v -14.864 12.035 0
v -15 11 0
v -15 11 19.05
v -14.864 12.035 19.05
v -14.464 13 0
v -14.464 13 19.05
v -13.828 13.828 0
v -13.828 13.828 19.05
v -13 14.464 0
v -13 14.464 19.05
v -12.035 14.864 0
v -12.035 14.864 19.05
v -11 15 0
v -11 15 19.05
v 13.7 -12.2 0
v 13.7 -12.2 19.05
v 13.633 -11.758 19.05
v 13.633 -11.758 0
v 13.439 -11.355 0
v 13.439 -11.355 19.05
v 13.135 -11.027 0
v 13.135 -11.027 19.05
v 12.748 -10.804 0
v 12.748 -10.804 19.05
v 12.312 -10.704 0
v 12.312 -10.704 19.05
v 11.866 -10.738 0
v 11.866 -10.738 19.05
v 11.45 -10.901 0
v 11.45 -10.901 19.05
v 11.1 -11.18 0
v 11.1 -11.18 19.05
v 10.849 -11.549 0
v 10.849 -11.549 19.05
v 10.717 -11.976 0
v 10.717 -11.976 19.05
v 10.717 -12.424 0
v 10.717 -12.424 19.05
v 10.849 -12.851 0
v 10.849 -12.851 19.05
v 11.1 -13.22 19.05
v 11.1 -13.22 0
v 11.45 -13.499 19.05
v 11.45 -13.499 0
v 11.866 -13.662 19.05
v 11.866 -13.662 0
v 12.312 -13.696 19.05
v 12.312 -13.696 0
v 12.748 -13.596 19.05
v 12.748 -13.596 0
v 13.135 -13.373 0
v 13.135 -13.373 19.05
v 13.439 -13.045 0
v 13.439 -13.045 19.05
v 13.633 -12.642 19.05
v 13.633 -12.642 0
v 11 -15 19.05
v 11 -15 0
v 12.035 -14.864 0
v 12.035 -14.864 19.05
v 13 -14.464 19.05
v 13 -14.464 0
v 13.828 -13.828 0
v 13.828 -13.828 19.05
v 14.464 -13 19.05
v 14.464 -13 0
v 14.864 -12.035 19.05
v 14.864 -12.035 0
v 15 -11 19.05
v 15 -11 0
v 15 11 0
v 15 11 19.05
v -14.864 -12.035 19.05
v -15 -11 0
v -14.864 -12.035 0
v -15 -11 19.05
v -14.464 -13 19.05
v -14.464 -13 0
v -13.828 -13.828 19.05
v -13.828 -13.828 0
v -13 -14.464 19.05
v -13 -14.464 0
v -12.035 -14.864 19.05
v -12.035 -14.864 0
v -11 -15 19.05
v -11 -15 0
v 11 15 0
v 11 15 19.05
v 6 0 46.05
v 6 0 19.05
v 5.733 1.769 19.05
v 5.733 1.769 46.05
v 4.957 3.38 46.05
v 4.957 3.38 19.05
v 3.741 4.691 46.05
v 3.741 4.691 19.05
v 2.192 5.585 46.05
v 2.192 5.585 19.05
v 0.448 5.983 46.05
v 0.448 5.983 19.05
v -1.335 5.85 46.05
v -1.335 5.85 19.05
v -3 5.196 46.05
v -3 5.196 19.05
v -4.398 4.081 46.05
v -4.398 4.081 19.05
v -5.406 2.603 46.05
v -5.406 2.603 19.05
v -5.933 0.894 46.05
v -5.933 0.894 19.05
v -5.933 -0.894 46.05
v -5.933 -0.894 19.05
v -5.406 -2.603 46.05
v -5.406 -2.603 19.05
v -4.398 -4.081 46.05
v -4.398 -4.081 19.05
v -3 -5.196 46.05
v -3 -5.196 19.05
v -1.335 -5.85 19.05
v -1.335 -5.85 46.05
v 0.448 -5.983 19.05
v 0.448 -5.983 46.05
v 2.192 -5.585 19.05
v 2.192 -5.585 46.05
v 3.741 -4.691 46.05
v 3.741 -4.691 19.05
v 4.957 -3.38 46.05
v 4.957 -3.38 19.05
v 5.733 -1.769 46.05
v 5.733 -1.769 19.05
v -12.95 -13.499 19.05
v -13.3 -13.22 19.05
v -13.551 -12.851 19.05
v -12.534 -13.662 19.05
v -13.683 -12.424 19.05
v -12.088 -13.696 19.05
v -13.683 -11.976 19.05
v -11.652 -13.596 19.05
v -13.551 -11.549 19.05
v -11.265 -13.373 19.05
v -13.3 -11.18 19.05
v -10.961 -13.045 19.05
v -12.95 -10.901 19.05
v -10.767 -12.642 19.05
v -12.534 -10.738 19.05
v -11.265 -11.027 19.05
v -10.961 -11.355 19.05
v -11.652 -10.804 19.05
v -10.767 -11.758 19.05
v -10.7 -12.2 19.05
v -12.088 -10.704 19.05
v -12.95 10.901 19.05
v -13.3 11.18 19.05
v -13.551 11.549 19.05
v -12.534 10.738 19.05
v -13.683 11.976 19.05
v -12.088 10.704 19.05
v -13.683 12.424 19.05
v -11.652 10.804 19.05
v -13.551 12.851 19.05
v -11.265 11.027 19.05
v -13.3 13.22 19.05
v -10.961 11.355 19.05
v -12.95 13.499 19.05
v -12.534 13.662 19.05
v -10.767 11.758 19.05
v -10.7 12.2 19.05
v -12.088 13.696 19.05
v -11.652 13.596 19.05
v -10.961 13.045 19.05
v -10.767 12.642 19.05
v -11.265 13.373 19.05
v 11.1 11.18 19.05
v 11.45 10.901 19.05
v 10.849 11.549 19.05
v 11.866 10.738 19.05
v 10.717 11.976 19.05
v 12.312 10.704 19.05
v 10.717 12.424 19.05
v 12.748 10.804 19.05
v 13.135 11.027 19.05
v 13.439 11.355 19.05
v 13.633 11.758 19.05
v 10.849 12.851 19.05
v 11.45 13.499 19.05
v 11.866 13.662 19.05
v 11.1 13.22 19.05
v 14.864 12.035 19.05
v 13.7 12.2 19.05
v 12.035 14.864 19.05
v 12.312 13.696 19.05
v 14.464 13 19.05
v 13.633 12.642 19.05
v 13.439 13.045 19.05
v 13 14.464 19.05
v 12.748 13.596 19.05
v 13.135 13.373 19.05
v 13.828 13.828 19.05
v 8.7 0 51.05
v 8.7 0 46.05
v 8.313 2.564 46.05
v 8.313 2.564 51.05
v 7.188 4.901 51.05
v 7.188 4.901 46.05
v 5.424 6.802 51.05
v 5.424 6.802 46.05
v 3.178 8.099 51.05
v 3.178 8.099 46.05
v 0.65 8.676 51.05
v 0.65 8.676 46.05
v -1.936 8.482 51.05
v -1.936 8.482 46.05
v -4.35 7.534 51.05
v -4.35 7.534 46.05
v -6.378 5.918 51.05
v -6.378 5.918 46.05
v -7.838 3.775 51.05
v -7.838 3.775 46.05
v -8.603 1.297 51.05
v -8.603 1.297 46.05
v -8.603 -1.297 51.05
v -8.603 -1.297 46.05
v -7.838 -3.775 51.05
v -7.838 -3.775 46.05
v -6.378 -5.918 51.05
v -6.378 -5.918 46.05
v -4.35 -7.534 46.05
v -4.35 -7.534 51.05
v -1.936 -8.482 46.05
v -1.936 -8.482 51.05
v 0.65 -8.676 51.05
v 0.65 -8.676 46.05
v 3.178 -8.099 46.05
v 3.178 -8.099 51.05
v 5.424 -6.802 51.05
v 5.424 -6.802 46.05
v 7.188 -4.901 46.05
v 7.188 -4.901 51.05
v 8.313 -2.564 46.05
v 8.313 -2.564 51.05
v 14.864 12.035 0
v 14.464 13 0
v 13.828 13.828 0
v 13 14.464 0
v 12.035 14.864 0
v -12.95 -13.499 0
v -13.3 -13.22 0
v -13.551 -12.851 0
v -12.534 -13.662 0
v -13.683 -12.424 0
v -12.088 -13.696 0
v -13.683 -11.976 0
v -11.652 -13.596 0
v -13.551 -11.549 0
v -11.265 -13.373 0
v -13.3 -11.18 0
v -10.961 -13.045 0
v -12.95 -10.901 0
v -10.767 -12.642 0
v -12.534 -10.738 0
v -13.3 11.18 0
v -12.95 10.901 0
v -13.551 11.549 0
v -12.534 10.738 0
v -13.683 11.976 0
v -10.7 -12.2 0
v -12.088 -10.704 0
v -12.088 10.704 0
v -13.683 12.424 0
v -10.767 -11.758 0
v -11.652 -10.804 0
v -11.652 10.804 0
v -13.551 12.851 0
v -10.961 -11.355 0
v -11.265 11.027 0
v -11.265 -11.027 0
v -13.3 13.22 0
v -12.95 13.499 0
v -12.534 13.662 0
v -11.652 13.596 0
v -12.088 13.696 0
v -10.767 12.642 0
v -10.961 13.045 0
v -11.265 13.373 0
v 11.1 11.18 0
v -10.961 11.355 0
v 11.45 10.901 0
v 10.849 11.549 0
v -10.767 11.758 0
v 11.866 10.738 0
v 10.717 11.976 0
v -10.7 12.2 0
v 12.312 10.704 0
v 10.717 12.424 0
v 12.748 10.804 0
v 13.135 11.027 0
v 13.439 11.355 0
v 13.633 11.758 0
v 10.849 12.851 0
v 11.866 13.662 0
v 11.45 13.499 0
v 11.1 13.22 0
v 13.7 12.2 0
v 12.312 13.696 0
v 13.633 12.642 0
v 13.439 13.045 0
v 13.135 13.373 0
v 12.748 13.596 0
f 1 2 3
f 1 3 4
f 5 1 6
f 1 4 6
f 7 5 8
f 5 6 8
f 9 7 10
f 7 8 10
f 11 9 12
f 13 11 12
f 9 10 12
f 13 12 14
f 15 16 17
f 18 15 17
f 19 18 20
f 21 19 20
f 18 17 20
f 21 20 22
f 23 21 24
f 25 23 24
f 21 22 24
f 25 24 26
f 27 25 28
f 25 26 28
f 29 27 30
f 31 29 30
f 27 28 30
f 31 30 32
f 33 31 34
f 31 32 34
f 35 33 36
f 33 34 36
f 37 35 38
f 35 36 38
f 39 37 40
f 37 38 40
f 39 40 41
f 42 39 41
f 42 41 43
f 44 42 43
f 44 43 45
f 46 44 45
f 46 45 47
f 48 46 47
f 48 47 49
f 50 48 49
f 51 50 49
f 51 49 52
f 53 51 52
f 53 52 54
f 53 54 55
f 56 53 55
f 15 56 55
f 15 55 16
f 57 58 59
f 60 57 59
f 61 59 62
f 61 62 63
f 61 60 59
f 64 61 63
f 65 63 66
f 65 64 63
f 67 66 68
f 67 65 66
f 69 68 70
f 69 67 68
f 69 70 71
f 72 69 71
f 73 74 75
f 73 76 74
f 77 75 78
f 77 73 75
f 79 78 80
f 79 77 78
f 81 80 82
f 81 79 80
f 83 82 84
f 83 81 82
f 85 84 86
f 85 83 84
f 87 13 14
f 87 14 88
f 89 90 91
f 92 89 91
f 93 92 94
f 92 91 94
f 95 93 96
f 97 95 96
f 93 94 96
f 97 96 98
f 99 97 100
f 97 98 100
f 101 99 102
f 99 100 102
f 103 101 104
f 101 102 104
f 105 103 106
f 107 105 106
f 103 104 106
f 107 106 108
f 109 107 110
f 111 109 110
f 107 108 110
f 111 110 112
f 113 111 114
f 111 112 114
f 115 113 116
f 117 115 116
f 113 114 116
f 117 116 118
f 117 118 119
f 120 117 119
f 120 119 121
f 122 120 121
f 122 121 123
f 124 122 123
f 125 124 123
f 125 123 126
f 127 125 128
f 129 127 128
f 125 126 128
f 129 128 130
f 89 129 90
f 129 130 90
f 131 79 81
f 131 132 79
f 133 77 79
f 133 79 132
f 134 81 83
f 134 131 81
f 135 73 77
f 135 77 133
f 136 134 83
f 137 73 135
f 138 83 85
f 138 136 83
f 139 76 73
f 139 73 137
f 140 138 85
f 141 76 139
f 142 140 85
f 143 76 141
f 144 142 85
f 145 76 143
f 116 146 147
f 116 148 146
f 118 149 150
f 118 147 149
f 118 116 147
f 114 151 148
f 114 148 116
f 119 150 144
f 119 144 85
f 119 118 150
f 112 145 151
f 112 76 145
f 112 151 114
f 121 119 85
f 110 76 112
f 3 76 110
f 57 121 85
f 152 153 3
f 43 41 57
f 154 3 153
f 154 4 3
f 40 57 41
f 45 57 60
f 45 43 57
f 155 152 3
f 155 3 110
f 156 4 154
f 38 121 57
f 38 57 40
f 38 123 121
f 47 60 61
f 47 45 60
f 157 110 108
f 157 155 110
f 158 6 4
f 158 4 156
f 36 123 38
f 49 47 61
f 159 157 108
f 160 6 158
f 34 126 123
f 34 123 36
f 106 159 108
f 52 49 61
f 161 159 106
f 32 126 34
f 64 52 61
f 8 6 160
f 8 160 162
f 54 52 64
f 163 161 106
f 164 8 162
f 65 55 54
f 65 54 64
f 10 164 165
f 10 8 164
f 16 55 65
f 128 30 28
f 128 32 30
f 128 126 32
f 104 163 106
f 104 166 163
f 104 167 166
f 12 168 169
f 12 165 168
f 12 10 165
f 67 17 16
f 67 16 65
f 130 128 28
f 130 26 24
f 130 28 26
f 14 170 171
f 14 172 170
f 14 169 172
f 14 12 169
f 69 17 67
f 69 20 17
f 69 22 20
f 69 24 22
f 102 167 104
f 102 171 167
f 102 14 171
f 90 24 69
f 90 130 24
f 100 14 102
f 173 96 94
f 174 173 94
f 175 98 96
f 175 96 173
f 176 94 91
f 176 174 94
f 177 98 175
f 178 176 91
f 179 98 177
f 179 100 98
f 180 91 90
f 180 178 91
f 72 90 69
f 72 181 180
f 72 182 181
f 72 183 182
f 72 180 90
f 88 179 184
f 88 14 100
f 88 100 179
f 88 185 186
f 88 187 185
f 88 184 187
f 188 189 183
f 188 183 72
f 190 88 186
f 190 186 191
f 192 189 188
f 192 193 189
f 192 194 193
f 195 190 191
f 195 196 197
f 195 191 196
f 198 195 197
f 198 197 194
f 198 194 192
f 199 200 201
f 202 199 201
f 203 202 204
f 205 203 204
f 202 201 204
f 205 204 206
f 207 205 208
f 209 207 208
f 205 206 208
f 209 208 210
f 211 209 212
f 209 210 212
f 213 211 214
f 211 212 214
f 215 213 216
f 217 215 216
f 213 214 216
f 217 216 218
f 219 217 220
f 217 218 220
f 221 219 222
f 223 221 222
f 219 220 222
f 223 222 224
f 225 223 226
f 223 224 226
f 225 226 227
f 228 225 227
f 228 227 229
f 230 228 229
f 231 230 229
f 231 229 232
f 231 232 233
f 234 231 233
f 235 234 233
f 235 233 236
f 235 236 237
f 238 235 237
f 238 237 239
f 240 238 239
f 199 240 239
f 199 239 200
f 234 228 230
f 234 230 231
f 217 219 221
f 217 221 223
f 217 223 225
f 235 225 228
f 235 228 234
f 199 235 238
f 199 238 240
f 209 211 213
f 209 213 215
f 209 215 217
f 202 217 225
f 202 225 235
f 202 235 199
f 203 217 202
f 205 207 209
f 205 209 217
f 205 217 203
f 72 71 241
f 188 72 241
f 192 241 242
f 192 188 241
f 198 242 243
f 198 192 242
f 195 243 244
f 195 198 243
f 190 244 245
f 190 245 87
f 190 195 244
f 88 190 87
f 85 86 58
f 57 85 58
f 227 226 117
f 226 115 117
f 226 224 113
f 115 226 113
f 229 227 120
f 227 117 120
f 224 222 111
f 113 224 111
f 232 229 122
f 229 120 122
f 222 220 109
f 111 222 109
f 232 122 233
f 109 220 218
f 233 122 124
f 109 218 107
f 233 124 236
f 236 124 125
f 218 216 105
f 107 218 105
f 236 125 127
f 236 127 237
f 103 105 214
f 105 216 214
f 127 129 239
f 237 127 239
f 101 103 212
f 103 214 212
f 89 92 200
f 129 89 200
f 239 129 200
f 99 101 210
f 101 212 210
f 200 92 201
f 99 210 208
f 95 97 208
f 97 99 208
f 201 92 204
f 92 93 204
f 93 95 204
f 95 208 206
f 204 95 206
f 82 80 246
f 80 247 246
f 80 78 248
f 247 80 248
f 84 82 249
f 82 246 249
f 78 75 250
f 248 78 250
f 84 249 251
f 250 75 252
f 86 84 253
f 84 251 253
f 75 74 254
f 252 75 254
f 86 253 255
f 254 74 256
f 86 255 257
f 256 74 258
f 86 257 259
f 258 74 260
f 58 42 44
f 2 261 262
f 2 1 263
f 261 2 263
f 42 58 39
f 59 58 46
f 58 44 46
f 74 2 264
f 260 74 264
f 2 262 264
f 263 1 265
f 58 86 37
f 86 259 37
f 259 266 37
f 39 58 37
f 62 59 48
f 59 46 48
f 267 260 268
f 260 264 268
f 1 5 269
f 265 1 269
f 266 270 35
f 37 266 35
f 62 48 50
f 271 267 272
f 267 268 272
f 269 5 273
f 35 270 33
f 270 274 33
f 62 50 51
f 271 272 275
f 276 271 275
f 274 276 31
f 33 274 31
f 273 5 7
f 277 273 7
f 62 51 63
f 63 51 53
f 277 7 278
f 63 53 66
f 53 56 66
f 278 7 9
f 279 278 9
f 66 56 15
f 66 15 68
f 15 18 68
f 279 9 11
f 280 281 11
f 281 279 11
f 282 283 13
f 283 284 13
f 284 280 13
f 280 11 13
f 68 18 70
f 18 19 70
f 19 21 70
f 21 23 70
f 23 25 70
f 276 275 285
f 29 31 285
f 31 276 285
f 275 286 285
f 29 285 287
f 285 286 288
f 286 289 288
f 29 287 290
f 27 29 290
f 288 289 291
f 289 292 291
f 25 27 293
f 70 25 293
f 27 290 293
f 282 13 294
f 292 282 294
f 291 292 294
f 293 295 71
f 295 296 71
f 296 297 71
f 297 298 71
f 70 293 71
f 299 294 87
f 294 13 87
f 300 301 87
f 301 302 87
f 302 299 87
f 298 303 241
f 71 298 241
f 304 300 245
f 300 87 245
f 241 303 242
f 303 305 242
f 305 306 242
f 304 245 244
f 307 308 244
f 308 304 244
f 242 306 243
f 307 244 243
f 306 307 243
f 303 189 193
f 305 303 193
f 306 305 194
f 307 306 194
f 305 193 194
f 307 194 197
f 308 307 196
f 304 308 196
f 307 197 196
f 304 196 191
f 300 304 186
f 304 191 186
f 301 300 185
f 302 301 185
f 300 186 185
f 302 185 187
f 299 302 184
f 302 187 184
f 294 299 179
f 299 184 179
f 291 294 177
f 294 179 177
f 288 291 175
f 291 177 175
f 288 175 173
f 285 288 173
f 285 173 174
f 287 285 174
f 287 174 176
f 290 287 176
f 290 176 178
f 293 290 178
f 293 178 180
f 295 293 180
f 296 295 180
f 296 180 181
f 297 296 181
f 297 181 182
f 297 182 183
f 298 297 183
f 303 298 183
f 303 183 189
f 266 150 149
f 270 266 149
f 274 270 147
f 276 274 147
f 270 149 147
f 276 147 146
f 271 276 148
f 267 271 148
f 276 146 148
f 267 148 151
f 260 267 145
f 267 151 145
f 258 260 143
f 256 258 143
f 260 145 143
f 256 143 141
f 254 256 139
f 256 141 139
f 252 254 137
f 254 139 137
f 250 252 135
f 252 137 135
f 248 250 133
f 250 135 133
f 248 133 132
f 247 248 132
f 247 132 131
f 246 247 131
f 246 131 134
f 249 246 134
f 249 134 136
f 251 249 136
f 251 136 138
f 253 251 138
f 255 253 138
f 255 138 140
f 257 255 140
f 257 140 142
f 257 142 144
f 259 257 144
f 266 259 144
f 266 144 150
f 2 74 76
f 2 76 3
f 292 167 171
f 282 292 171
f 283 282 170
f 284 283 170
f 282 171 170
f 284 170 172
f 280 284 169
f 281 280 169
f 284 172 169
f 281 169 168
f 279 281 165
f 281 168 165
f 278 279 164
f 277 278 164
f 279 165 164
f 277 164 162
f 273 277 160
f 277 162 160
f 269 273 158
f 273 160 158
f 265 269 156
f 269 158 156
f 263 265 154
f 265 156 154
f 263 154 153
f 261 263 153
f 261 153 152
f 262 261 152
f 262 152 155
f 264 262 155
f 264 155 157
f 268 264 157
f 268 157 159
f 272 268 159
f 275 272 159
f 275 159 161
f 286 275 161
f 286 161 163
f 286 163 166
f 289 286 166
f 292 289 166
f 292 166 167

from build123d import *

# Parameters (mm, degrees)
SKETCH1_W           = 30
SKETCH1_H           = 30
BOSS_EXTRUDE1_DEPTH = 19.05
FILLET1_R           = 4
SKETCH2_R           = 1.5
CUT_EXTRUDE1_DEPTH  = 20.05
SKETCH3_R           = 8.7
BOSS_EXTRUDE2_DEPTH = 32
SKETCH4_R           = 8.7
SKETCH4_R_2         = 6
CUT_EXTRUDE2_DEPTH  = 27


with BuildPart() as part:
    # Sketch1 → Boss-Extrude1 (new body)
    with BuildSketch(Plane.XY):
        Rectangle(SKETCH1_W, SKETCH1_H)
    extrude(amount=BOSS_EXTRUDE1_DEPTH)

    # Fillet1
    fillet1_edges = [part.edges().sort_by_distance(p)[0] for p in [
        (15, -15, 9.525),
        (-15, -15, 9.525),
        (-15, 15, 9.525),
        (15, 15, 9.525),
    ]]
    fillet(fillet1_edges, radius=FILLET1_R)

    # Sketch2 → Cut-Extrude1 (cut, through all)
    with BuildSketch(Plane.XY.offset(19.05)):
        with Locations((-12.2, 12.2)):
            Circle(SKETCH2_R)
        with Locations((12.2, 12.2)):
            Circle(SKETCH2_R)
        with Locations((12.2, -12.2)):
            Circle(SKETCH2_R)
        with Locations((-12.2, -12.2)):
            Circle(SKETCH2_R)
    extrude(amount=-CUT_EXTRUDE1_DEPTH, mode=Mode.SUBTRACT)

    # Sketch3 → Boss-Extrude2 (add)
    with BuildSketch(Plane.XY.offset(19.05)):
        Circle(SKETCH3_R)
    extrude(amount=BOSS_EXTRUDE2_DEPTH)

    # Sketch4 → Cut-Extrude2 (cut)
    with BuildSketch(Plane.XY.offset(19.05)):
        Circle(SKETCH4_R)
        Circle(SKETCH4_R_2, mode=Mode.SUBTRACT)
    extrude(amount=CUT_EXTRUDE2_DEPTH, mode=Mode.SUBTRACT)


solid = part.part
